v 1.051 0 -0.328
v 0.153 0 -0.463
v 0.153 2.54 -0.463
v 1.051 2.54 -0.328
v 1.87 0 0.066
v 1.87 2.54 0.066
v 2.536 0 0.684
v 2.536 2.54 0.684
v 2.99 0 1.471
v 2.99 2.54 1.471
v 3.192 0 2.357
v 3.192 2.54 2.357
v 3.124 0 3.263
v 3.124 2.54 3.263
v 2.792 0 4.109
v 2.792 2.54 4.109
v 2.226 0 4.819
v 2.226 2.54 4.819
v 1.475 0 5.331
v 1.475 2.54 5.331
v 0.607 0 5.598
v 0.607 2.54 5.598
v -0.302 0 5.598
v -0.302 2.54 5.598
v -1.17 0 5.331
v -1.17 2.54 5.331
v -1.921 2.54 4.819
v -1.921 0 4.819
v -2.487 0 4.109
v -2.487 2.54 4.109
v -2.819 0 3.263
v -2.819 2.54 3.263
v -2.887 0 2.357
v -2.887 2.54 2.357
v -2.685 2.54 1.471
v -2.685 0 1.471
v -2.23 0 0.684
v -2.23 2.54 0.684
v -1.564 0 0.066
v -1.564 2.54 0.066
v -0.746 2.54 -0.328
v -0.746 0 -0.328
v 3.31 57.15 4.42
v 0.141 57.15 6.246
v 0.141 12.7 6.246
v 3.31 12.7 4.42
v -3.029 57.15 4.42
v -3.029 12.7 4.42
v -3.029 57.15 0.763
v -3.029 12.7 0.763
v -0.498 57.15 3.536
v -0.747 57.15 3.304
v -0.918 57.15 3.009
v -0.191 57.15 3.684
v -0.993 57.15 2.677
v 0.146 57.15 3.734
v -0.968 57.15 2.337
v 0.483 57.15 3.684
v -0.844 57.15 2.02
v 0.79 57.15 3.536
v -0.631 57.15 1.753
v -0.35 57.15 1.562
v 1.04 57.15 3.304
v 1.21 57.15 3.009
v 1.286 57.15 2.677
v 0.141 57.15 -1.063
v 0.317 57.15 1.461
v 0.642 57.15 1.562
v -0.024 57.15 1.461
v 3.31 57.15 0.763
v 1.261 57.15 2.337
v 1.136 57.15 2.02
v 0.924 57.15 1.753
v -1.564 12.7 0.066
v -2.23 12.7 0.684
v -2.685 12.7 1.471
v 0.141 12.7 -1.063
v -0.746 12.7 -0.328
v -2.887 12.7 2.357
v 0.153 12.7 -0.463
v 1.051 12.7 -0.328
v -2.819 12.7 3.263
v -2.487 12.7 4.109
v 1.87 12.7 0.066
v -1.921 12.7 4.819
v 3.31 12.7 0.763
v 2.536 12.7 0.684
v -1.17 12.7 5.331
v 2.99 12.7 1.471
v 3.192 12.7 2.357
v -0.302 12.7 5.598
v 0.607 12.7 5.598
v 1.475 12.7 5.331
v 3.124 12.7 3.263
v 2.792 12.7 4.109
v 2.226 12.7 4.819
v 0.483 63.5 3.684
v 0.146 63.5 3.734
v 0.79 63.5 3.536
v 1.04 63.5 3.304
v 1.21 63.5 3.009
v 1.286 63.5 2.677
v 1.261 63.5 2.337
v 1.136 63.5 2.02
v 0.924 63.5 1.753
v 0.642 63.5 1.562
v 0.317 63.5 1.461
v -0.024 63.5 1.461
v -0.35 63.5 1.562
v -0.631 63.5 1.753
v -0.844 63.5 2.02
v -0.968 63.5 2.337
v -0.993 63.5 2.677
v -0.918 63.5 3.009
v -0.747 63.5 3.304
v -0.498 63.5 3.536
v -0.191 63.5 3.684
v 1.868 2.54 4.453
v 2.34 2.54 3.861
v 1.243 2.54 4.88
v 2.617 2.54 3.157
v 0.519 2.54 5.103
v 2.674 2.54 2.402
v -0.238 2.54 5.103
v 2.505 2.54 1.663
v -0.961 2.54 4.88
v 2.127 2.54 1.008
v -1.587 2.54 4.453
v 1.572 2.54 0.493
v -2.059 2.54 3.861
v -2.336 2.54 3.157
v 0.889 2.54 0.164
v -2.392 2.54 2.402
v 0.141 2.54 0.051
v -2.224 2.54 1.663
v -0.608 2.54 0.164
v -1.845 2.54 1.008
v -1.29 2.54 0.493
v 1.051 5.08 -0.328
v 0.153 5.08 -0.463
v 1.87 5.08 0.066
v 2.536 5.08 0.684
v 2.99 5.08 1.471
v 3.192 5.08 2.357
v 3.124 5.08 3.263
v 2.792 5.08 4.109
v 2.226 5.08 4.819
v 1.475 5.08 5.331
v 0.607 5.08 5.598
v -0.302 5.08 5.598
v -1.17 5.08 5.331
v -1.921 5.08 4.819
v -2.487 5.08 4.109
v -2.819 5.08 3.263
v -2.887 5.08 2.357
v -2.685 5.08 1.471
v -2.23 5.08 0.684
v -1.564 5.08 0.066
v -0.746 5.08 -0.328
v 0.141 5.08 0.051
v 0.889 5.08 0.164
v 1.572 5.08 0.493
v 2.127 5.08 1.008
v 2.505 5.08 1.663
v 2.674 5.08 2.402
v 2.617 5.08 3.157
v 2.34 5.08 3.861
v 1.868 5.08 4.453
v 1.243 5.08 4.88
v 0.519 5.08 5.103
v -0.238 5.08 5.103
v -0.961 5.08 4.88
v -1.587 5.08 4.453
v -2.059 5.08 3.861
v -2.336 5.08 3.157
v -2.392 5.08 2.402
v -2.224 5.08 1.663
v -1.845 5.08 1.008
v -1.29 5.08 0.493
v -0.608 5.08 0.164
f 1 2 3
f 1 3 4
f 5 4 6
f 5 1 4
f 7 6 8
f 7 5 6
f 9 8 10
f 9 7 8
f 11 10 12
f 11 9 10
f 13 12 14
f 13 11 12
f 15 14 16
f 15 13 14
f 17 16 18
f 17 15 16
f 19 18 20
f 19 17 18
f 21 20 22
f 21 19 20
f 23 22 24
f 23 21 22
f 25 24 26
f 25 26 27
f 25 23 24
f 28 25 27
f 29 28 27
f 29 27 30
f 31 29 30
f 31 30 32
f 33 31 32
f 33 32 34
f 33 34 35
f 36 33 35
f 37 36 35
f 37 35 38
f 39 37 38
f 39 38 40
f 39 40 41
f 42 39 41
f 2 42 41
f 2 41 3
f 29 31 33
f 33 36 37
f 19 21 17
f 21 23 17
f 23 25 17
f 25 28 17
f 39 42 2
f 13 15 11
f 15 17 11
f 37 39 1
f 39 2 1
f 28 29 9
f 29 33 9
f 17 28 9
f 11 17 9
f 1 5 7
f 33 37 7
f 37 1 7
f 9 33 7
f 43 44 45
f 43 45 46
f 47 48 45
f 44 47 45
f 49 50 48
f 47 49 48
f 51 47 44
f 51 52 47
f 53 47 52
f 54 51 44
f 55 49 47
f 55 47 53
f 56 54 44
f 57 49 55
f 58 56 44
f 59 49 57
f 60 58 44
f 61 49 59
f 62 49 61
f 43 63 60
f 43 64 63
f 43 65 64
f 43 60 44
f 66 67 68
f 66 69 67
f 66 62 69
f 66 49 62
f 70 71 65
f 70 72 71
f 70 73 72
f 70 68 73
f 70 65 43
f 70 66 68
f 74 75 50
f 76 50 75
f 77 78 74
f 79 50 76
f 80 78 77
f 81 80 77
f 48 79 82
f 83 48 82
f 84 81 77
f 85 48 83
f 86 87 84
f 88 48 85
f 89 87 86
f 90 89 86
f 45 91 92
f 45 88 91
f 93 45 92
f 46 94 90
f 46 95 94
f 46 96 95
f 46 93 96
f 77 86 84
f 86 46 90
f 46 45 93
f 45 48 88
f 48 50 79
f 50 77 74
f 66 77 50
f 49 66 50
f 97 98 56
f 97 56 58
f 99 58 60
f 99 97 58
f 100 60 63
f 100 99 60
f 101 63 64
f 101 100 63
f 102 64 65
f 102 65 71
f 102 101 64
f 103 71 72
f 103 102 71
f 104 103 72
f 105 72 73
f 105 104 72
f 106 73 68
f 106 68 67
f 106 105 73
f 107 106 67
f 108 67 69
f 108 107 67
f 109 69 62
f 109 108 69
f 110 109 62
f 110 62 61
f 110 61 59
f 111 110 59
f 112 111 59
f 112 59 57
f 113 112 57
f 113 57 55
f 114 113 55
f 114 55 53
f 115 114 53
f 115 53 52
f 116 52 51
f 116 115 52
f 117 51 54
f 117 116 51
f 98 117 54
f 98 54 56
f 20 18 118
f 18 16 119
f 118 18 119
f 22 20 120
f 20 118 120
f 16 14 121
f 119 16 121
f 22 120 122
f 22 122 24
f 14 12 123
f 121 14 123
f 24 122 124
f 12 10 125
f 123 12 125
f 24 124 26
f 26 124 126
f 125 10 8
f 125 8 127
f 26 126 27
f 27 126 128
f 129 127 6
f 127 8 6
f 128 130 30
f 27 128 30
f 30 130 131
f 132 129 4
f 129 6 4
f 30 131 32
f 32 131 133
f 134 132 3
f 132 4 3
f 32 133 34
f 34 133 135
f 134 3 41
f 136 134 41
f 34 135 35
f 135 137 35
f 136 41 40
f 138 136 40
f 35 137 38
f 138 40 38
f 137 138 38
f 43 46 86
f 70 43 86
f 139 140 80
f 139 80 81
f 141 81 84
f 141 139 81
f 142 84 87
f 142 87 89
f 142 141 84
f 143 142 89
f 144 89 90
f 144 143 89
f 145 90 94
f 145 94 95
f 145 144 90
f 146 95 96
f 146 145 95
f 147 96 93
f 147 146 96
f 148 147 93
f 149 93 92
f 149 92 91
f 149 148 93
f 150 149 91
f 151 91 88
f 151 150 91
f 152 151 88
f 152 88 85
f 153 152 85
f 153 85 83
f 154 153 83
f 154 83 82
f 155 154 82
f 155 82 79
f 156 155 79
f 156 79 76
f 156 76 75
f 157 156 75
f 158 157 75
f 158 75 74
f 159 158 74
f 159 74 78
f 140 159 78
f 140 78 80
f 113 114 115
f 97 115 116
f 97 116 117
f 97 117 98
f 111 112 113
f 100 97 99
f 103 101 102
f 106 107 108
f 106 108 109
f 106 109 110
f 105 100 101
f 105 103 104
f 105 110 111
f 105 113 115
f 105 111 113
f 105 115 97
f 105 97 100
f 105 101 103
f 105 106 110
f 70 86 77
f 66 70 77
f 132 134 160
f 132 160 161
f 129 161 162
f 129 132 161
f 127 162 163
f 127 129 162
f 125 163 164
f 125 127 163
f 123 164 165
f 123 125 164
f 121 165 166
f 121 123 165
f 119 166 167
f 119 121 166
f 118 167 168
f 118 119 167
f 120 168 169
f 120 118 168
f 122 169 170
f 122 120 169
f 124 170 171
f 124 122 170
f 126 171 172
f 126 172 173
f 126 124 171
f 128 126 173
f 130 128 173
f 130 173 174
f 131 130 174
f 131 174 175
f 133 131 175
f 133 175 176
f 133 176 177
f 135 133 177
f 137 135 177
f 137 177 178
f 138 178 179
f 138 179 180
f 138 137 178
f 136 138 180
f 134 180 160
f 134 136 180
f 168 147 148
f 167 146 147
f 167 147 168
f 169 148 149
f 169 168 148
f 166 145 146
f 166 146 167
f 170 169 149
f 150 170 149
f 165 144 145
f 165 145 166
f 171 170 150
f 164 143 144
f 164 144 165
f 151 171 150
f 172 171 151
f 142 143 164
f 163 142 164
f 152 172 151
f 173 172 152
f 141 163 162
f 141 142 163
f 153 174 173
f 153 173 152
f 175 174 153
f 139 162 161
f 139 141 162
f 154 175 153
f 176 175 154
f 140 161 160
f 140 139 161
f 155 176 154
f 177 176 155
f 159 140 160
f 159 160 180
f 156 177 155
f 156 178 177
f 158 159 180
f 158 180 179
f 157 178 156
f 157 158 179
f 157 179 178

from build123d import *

# Parameters (mm, degrees)
BOSS_EXTRUDE1_DEPTH = 63.5
SKETCH2_OUTSIDE_W   = 21.185
SKETCH2_OUTSIDE_H   = 22.155
SKETCH2_OUTSIDE_R   = 1.143
CUT_EXTRUDE1_DEPTH  = 6.35
SKETCH3_OUTSIDE_W   = 21.185
SKETCH3_OUTSIDE_H   = 22.155
SKETCH3_OUTSIDE_R   = 3.048
CUT_EXTRUDE2_DEPTH  = 12.7
SKETCH4_OUTSIDE_W   = 21.185
SKETCH4_OUTSIDE_H   = 22.155
SKETCH4_OUTSIDE_R   = 2.54
CUT_EXTRUDE3_DEPTH  = 2.54


with BuildPart() as part:
    # Sketch1 → Boss-Extrude1 (new body)
    with BuildSketch(Plane(origin=(0, 0, 0), x_dir=(1, 0, 0), z_dir=(0, 1, 0))):
        Polygon((3.310191022, -4.420128359), (3.310191022, -0.762528359), (0.140765019, 1.063061018), (-3.028660983, -0.762528359), (-3.028660983, -4.420128359), (0.140765019, -6.245717737), align=None)
    extrude(amount=BOSS_EXTRUDE1_DEPTH)

    # Sketch2 outside → Cut-Extrude1 (cut)
    with BuildSketch(Plane(origin=(0, 63.5, 0), x_dir=(1, 0, 0), z_dir=(0, 1, 0))):
        with Locations((0.1405, -2.5915)):
            Rectangle(SKETCH2_OUTSIDE_W, SKETCH2_OUTSIDE_H)
        with Locations(Location((0.146339017, -2.591328359, 0), (0, 0, 270))):
            Circle(SKETCH2_OUTSIDE_R, mode=Mode.SUBTRACT)
    extrude(amount=-CUT_EXTRUDE1_DEPTH, mode=Mode.SUBTRACT)

    # Sketch3 outside → Cut-Extrude2 (cut)
    with BuildSketch(Plane.XZ):
        with Locations((0.1405, 2.5915)):
            Rectangle(SKETCH3_OUTSIDE_W, SKETCH3_OUTSIDE_H)
        with Locations(Location((0.152614949, 2.5845028, 0), (0, 0, 270))):
            Circle(SKETCH3_OUTSIDE_R, mode=Mode.SUBTRACT)
    extrude(amount=-CUT_EXTRUDE2_DEPTH, mode=Mode.SUBTRACT)

    # Sketch4 outside → Cut-Extrude3 (cut)
    with BuildSketch(Plane(origin=(0, 2.54, 0), x_dir=(-1, 0, 0), z_dir=(0, -1, 0))):
        with Locations((-0.1405, -2.5915)):
            Rectangle(SKETCH4_OUTSIDE_W, SKETCH4_OUTSIDE_H)
        with Locations(Location((-0.140765019, -2.591328359, 0), (0, 0, 90))):
            Circle(SKETCH4_OUTSIDE_R, mode=Mode.SUBTRACT)
    extrude(amount=-CUT_EXTRUDE3_DEPTH, mode=Mode.SUBTRACT)


solid = part.part
